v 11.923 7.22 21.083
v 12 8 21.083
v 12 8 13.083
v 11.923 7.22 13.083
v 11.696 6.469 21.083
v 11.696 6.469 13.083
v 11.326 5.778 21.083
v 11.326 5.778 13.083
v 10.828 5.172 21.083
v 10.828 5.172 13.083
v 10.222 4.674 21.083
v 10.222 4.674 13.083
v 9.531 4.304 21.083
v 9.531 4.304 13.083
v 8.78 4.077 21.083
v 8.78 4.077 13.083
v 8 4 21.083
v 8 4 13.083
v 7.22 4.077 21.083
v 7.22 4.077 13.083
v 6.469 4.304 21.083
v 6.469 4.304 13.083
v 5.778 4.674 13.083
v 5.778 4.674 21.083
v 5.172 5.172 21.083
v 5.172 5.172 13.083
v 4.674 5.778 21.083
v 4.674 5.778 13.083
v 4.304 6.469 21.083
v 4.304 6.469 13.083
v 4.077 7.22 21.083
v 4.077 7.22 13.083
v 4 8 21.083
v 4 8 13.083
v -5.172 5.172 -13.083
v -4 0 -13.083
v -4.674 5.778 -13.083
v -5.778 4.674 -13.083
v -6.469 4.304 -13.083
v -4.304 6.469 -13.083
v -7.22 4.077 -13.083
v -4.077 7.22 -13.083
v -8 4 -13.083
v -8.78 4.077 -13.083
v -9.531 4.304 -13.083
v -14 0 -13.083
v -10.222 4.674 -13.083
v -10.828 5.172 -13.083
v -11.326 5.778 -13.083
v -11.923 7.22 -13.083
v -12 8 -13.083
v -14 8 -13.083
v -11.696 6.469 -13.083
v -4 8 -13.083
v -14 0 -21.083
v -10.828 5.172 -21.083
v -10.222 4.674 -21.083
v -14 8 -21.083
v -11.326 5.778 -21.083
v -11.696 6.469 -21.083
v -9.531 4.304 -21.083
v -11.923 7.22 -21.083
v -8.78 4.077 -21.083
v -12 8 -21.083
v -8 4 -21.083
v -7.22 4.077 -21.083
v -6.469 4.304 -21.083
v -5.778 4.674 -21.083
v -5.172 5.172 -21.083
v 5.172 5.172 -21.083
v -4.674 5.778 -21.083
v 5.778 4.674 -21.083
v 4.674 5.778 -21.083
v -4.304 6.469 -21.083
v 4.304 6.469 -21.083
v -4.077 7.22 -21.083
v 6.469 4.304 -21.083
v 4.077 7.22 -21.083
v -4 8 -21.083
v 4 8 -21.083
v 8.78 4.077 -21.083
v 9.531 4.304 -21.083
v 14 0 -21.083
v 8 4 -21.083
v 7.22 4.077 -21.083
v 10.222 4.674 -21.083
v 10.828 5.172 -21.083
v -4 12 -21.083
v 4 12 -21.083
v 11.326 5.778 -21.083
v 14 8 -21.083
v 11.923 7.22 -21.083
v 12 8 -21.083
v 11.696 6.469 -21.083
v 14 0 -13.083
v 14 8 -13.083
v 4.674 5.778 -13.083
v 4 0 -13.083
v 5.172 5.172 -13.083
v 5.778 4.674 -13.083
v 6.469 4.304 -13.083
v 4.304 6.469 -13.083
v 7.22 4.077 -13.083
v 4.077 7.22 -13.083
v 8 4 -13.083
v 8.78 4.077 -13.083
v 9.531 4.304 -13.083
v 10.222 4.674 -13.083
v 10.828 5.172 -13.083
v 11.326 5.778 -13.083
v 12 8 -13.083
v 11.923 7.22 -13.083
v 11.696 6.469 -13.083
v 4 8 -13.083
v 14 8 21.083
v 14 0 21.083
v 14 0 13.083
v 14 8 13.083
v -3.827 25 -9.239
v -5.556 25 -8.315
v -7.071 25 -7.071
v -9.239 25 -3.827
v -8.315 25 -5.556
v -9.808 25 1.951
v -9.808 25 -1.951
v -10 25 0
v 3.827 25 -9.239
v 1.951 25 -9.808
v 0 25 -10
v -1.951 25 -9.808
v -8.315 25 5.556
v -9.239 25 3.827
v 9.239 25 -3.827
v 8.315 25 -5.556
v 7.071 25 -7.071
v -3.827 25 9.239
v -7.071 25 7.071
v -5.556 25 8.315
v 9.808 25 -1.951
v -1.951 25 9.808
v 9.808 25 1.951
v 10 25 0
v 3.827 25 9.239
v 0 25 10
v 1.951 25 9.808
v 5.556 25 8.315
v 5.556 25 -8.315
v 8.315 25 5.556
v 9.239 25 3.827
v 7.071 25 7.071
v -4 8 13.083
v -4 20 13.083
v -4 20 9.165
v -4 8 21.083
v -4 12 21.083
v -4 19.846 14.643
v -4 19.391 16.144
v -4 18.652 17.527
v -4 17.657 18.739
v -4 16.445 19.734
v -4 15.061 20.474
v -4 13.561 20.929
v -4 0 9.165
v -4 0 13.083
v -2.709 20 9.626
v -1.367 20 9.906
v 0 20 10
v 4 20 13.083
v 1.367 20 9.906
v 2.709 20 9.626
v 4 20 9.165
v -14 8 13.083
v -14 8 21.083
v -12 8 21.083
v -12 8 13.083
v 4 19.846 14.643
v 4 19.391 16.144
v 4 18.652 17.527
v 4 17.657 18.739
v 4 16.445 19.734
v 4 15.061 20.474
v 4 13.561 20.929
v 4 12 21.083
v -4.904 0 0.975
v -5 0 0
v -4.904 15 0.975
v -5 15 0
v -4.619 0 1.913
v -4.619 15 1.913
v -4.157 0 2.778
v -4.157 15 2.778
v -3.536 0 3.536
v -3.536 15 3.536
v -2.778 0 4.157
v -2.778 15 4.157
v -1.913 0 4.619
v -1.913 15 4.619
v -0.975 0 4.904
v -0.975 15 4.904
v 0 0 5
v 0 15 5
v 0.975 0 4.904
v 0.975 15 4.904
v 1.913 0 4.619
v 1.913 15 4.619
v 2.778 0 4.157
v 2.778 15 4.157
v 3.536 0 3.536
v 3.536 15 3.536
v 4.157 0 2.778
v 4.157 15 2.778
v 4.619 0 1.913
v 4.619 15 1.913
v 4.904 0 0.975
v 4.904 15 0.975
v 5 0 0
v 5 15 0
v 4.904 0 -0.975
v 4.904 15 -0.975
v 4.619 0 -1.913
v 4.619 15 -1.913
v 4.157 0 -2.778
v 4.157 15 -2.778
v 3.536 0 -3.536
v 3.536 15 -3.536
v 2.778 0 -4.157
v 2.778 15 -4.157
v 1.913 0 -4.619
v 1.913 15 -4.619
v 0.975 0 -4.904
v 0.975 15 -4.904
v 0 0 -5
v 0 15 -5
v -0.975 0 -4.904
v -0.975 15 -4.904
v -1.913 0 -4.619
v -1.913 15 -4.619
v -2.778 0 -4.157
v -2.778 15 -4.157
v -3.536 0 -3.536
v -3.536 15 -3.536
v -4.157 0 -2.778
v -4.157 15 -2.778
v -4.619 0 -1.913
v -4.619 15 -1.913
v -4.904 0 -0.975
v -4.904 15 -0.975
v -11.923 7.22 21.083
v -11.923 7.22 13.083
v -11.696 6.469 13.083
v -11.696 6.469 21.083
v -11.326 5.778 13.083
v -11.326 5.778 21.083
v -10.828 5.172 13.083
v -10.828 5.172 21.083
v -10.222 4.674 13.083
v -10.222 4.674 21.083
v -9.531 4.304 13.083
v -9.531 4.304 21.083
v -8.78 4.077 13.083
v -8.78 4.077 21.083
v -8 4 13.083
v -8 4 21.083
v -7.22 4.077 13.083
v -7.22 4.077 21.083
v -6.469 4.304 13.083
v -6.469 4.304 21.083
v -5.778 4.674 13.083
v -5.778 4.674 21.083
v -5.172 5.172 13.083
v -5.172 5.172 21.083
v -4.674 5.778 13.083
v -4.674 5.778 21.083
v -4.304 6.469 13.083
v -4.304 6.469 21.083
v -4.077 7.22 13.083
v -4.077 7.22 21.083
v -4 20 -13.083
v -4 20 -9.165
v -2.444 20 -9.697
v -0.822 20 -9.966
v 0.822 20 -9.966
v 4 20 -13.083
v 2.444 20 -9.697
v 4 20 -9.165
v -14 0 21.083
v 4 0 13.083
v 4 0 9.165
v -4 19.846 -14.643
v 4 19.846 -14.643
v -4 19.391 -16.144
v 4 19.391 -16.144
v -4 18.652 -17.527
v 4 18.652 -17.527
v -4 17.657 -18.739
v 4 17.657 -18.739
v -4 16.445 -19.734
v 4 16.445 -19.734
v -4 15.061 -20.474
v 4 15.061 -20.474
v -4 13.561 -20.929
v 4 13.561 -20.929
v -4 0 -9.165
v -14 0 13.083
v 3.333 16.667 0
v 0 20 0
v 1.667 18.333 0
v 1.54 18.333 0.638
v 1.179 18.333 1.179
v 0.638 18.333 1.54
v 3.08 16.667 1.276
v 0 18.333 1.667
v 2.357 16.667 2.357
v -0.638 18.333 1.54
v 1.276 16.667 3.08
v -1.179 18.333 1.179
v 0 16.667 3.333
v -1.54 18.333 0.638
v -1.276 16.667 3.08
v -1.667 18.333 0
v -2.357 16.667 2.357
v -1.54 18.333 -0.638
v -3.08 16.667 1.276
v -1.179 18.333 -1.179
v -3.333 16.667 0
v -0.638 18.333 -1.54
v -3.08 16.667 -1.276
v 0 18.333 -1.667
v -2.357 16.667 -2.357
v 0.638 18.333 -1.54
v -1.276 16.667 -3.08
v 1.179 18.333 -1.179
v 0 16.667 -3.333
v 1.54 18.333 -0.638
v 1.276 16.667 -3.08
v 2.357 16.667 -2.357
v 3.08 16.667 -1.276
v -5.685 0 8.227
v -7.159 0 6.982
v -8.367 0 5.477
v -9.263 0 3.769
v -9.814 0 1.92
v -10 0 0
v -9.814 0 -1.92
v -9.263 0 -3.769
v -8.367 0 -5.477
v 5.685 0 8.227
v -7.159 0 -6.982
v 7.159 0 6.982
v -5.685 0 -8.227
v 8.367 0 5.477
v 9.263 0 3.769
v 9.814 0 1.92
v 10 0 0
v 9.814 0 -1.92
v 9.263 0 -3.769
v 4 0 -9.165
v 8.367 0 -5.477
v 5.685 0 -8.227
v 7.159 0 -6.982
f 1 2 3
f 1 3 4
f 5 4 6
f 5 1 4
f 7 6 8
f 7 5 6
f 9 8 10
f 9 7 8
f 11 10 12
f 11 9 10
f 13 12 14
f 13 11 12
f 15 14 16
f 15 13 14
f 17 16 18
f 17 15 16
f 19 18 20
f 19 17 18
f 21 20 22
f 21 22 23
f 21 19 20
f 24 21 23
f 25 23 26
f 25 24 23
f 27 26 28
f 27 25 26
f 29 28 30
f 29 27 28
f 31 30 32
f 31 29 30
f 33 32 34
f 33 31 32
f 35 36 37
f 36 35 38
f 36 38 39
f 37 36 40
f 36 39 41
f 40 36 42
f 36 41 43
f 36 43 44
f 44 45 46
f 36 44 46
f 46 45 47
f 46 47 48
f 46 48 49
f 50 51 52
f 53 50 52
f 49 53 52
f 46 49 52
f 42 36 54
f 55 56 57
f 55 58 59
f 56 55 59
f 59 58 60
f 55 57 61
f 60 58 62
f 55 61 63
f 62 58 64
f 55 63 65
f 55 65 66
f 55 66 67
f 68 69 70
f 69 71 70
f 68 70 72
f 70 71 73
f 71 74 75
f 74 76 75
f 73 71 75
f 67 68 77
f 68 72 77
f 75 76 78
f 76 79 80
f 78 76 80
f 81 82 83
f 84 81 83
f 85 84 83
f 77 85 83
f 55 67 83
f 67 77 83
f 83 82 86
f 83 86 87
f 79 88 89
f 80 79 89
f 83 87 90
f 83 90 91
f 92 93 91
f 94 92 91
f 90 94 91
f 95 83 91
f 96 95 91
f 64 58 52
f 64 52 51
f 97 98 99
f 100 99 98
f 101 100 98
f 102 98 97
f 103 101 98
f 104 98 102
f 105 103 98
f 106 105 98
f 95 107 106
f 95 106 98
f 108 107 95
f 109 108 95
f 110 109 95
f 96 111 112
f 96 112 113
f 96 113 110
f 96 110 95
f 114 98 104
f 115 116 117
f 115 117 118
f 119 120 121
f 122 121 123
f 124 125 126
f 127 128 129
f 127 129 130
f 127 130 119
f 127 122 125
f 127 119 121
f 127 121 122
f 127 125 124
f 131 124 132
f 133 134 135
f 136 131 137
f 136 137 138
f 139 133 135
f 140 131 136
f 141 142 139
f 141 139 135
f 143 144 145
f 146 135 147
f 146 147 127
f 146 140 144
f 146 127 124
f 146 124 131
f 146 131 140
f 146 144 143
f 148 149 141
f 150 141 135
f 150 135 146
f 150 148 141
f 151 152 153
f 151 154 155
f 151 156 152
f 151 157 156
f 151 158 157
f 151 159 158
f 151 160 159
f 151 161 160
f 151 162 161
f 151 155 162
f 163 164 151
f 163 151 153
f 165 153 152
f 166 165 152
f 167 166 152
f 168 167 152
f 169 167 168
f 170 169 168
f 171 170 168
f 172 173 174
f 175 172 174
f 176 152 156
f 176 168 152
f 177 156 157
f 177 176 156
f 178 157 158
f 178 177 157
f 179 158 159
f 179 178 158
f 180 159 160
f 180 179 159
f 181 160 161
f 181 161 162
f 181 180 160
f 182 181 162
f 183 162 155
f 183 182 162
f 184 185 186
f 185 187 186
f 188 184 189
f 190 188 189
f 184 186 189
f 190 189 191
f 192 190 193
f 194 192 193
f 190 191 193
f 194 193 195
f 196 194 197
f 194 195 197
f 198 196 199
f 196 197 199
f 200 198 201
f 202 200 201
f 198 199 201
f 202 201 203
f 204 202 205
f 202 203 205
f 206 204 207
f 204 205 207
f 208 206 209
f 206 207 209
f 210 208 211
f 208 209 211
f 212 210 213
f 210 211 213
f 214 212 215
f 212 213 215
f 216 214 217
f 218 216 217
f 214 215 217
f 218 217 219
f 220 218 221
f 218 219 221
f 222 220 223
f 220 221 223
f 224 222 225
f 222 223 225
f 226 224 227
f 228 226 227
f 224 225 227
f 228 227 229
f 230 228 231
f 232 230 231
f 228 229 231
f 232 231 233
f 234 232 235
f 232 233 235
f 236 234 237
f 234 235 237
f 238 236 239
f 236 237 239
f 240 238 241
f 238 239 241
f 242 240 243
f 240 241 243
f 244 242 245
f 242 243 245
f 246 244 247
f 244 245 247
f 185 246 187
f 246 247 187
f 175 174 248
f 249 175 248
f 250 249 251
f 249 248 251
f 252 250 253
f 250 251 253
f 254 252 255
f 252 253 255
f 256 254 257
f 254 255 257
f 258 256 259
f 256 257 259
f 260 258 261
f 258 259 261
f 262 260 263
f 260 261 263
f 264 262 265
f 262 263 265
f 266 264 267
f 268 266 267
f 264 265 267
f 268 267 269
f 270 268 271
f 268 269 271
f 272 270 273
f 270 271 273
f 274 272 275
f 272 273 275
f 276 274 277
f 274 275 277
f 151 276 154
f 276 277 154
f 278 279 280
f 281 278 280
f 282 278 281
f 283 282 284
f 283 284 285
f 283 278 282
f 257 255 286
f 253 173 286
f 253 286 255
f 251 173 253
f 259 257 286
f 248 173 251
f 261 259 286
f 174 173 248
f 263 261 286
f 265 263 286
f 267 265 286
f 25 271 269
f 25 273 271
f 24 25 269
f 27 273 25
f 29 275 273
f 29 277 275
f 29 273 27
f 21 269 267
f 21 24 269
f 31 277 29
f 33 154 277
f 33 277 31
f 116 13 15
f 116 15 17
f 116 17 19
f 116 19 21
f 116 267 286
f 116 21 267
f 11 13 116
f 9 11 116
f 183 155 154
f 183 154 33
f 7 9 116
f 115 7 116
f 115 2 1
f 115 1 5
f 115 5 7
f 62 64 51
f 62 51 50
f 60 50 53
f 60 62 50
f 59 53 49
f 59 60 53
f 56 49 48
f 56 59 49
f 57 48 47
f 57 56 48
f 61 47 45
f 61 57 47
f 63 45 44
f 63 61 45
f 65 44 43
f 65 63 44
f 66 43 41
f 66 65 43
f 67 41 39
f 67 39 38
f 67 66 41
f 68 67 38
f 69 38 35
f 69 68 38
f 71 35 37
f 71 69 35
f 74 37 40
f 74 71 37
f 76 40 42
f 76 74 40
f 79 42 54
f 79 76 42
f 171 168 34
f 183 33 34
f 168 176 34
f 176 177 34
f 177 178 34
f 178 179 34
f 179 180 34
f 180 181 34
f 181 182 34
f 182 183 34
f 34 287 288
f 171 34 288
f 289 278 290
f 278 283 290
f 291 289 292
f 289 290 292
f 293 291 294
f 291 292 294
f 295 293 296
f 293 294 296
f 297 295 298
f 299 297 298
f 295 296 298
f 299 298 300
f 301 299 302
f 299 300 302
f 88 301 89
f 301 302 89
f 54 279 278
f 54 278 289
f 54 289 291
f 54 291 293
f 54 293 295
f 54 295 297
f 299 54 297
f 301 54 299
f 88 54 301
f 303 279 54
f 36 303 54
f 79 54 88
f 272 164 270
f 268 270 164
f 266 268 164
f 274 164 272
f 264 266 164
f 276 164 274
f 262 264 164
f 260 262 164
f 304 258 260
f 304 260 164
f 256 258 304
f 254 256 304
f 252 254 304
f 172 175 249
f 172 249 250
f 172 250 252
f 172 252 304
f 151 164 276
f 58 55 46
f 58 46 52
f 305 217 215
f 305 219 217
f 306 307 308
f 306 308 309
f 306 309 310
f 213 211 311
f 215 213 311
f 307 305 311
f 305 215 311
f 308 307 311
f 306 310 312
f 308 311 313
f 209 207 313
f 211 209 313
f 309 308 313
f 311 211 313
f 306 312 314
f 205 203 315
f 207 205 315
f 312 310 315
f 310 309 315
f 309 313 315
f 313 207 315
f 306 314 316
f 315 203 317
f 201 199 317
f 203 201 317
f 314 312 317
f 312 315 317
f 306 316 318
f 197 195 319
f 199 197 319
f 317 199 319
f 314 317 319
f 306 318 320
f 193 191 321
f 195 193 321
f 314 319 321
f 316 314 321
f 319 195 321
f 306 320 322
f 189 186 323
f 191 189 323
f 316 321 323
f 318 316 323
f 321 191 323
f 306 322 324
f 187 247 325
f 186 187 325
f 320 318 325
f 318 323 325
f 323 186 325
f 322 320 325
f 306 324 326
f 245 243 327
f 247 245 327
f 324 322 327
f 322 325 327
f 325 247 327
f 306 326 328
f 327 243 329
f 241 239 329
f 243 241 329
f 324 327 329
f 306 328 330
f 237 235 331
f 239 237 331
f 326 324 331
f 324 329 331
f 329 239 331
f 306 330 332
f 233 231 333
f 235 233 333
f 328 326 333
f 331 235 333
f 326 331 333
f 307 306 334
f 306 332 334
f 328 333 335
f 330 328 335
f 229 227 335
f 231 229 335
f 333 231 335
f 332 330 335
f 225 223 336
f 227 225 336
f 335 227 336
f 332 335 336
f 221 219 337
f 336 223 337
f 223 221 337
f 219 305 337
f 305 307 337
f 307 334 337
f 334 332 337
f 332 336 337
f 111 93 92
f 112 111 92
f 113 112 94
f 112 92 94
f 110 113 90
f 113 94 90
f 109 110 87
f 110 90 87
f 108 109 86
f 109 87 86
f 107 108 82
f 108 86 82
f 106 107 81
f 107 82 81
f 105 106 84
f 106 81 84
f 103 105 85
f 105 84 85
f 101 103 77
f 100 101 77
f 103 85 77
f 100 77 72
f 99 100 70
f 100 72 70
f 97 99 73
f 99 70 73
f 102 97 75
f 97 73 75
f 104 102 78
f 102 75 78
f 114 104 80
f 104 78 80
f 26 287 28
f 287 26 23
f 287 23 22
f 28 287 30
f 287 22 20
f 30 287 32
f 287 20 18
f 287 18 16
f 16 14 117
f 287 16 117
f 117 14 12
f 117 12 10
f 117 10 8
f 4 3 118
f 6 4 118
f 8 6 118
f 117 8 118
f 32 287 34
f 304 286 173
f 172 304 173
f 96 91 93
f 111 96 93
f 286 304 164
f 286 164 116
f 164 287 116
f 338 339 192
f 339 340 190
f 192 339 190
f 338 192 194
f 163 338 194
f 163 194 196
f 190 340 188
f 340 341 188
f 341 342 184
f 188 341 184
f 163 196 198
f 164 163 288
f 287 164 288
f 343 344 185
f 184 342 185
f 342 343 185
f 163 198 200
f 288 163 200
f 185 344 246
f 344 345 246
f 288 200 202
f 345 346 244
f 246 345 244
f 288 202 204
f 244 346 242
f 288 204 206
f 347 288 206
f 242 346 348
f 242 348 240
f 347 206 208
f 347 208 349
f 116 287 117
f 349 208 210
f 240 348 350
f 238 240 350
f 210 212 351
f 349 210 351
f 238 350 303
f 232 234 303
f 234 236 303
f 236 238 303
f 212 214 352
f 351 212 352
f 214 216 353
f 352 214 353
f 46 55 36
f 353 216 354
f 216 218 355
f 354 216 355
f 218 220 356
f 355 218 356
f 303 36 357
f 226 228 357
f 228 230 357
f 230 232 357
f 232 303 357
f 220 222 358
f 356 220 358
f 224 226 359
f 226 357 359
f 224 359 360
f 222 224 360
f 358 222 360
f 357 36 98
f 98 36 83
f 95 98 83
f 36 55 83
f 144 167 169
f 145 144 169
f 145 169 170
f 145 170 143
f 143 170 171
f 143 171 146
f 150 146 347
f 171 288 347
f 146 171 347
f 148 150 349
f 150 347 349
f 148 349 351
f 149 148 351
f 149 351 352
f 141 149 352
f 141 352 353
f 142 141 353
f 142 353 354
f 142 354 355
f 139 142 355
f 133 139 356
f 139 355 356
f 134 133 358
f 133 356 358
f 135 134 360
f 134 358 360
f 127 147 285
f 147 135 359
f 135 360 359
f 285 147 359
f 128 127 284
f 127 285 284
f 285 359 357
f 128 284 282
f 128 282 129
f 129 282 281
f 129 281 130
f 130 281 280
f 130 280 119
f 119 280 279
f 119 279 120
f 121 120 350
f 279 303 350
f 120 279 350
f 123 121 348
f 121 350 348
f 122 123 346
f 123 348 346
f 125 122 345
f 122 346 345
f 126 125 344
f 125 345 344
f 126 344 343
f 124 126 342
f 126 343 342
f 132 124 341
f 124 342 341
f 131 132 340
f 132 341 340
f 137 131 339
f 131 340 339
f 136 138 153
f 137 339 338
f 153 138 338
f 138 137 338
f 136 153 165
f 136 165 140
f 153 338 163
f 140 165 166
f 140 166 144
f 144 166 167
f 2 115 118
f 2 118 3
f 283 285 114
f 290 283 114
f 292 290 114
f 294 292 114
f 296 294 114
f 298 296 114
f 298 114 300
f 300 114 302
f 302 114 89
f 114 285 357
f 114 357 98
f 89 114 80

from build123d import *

# Parameters (mm, degrees)
SKETCH2_W                = 8
SKETCH2_H                = 42.16515139
BOSS_EXTRUDE3_DEPTH      = 20
BOSS_EXTRUDE4_DEPTH      = 5
BOSS_EXTRUDE4_DEPTH_BACK = 20
SKETCH4_R                = 10
HOLE1_D                  = 10
HOLE1_DEPTH              = 15
HOLE1_TIP                = 5
BOSS_EXTRUDE5_DEPTH      = 8
MIRROR3_COPY_1_DEPTH     = 8
FILLET1_R                = 8


with BuildPart() as part:
    # Sketch2 → Boss-Extrude3 (new body)
    with BuildSketch(Plane(origin=(0, 0, 0), x_dir=(1, 0, 0), z_dir=(0, 1, 0))):
        Rectangle(SKETCH2_W, SKETCH2_H)
    extrude(amount=BOSS_EXTRUDE3_DEPTH)

    # Sketch4 → Boss-Extrude4 (add, two sides: drawn at the far end of the back side and taken through both)
    with BuildSketch(Plane(origin=(0, 20, 0), x_dir=(-1, 0, 0), z_dir=(0, 1, 0)).offset(-BOSS_EXTRUDE4_DEPTH_BACK)):
        with Locations(Location((0, 0, 0), (0, 0, 90))):
            Circle(SKETCH4_R)
    extrude(amount=BOSS_EXTRUDE4_DEPTH + BOSS_EXTRUDE4_DEPTH_BACK)

    # Hole1
    with Locations(Plane.XZ):
        with Locations((0, 0)):
            Hole(HOLE1_D / 2, depth=HOLE1_DEPTH)
            with Locations((0, 0, -(HOLE1_DEPTH + HOLE1_TIP / 2))):  # 90° drill point
                Cone(0, HOLE1_D / 2, HOLE1_TIP, mode=Mode.SUBTRACT)

    # Sketch10 → Boss-Extrude5 (add)
    with BuildSketch(Plane.XY.offset(21.082575695)):
        with BuildLine():
            Line((-4, 0), (-14, 0))
            Line((-14, 0), (-14, 8))
            Line((-14, 8), (-12, 8))
            ThreePointArc((-12, 8), (-8, 4), (-4, 8))
            Line((-4, 8), (-4, 0))
        make_face()
    boss_extrude5 = extrude(amount=-BOSS_EXTRUDE5_DEPTH)

    # Mirror2: Boss-Extrude5 across plane
    add(boss_extrude5.mirror(Plane(origin=(0, 0, 0), x_dir=(0, 0, 1), z_dir=(1, 0, 0))))

    # Mirror3: Boss-Extrude5 across plane
    add(boss_extrude5.mirror(Plane.XY))

    # Mirror3 copy 1 sketch → Mirror3 copy 1 (add)
    with BuildSketch(Plane(origin=(0, 0, -21.082575695), x_dir=(-1, 0, 0), z_dir=(0, 0, -1))):
        with BuildLine():
            Line((-4, 0), (-14, 0))
            Line((-14, 0), (-14, 8))
            Line((-14, 8), (-12, 8))
            ThreePointArc((-12, 8), (-8, 4), (-4, 8))
            Line((-4, 8), (-4, 0))
        make_face()
    extrude(amount=-MIRROR3_COPY_1_DEPTH)

    # Fillet1
    fillet1_edges = [part.edges().sort_by_distance(p)[0] for p in [
        (0, 20, -21.082575695),
        (0, 20, 21.082575695),
    ]]
    fillet(fillet1_edges, radius=FILLET1_R)


solid = part.part
